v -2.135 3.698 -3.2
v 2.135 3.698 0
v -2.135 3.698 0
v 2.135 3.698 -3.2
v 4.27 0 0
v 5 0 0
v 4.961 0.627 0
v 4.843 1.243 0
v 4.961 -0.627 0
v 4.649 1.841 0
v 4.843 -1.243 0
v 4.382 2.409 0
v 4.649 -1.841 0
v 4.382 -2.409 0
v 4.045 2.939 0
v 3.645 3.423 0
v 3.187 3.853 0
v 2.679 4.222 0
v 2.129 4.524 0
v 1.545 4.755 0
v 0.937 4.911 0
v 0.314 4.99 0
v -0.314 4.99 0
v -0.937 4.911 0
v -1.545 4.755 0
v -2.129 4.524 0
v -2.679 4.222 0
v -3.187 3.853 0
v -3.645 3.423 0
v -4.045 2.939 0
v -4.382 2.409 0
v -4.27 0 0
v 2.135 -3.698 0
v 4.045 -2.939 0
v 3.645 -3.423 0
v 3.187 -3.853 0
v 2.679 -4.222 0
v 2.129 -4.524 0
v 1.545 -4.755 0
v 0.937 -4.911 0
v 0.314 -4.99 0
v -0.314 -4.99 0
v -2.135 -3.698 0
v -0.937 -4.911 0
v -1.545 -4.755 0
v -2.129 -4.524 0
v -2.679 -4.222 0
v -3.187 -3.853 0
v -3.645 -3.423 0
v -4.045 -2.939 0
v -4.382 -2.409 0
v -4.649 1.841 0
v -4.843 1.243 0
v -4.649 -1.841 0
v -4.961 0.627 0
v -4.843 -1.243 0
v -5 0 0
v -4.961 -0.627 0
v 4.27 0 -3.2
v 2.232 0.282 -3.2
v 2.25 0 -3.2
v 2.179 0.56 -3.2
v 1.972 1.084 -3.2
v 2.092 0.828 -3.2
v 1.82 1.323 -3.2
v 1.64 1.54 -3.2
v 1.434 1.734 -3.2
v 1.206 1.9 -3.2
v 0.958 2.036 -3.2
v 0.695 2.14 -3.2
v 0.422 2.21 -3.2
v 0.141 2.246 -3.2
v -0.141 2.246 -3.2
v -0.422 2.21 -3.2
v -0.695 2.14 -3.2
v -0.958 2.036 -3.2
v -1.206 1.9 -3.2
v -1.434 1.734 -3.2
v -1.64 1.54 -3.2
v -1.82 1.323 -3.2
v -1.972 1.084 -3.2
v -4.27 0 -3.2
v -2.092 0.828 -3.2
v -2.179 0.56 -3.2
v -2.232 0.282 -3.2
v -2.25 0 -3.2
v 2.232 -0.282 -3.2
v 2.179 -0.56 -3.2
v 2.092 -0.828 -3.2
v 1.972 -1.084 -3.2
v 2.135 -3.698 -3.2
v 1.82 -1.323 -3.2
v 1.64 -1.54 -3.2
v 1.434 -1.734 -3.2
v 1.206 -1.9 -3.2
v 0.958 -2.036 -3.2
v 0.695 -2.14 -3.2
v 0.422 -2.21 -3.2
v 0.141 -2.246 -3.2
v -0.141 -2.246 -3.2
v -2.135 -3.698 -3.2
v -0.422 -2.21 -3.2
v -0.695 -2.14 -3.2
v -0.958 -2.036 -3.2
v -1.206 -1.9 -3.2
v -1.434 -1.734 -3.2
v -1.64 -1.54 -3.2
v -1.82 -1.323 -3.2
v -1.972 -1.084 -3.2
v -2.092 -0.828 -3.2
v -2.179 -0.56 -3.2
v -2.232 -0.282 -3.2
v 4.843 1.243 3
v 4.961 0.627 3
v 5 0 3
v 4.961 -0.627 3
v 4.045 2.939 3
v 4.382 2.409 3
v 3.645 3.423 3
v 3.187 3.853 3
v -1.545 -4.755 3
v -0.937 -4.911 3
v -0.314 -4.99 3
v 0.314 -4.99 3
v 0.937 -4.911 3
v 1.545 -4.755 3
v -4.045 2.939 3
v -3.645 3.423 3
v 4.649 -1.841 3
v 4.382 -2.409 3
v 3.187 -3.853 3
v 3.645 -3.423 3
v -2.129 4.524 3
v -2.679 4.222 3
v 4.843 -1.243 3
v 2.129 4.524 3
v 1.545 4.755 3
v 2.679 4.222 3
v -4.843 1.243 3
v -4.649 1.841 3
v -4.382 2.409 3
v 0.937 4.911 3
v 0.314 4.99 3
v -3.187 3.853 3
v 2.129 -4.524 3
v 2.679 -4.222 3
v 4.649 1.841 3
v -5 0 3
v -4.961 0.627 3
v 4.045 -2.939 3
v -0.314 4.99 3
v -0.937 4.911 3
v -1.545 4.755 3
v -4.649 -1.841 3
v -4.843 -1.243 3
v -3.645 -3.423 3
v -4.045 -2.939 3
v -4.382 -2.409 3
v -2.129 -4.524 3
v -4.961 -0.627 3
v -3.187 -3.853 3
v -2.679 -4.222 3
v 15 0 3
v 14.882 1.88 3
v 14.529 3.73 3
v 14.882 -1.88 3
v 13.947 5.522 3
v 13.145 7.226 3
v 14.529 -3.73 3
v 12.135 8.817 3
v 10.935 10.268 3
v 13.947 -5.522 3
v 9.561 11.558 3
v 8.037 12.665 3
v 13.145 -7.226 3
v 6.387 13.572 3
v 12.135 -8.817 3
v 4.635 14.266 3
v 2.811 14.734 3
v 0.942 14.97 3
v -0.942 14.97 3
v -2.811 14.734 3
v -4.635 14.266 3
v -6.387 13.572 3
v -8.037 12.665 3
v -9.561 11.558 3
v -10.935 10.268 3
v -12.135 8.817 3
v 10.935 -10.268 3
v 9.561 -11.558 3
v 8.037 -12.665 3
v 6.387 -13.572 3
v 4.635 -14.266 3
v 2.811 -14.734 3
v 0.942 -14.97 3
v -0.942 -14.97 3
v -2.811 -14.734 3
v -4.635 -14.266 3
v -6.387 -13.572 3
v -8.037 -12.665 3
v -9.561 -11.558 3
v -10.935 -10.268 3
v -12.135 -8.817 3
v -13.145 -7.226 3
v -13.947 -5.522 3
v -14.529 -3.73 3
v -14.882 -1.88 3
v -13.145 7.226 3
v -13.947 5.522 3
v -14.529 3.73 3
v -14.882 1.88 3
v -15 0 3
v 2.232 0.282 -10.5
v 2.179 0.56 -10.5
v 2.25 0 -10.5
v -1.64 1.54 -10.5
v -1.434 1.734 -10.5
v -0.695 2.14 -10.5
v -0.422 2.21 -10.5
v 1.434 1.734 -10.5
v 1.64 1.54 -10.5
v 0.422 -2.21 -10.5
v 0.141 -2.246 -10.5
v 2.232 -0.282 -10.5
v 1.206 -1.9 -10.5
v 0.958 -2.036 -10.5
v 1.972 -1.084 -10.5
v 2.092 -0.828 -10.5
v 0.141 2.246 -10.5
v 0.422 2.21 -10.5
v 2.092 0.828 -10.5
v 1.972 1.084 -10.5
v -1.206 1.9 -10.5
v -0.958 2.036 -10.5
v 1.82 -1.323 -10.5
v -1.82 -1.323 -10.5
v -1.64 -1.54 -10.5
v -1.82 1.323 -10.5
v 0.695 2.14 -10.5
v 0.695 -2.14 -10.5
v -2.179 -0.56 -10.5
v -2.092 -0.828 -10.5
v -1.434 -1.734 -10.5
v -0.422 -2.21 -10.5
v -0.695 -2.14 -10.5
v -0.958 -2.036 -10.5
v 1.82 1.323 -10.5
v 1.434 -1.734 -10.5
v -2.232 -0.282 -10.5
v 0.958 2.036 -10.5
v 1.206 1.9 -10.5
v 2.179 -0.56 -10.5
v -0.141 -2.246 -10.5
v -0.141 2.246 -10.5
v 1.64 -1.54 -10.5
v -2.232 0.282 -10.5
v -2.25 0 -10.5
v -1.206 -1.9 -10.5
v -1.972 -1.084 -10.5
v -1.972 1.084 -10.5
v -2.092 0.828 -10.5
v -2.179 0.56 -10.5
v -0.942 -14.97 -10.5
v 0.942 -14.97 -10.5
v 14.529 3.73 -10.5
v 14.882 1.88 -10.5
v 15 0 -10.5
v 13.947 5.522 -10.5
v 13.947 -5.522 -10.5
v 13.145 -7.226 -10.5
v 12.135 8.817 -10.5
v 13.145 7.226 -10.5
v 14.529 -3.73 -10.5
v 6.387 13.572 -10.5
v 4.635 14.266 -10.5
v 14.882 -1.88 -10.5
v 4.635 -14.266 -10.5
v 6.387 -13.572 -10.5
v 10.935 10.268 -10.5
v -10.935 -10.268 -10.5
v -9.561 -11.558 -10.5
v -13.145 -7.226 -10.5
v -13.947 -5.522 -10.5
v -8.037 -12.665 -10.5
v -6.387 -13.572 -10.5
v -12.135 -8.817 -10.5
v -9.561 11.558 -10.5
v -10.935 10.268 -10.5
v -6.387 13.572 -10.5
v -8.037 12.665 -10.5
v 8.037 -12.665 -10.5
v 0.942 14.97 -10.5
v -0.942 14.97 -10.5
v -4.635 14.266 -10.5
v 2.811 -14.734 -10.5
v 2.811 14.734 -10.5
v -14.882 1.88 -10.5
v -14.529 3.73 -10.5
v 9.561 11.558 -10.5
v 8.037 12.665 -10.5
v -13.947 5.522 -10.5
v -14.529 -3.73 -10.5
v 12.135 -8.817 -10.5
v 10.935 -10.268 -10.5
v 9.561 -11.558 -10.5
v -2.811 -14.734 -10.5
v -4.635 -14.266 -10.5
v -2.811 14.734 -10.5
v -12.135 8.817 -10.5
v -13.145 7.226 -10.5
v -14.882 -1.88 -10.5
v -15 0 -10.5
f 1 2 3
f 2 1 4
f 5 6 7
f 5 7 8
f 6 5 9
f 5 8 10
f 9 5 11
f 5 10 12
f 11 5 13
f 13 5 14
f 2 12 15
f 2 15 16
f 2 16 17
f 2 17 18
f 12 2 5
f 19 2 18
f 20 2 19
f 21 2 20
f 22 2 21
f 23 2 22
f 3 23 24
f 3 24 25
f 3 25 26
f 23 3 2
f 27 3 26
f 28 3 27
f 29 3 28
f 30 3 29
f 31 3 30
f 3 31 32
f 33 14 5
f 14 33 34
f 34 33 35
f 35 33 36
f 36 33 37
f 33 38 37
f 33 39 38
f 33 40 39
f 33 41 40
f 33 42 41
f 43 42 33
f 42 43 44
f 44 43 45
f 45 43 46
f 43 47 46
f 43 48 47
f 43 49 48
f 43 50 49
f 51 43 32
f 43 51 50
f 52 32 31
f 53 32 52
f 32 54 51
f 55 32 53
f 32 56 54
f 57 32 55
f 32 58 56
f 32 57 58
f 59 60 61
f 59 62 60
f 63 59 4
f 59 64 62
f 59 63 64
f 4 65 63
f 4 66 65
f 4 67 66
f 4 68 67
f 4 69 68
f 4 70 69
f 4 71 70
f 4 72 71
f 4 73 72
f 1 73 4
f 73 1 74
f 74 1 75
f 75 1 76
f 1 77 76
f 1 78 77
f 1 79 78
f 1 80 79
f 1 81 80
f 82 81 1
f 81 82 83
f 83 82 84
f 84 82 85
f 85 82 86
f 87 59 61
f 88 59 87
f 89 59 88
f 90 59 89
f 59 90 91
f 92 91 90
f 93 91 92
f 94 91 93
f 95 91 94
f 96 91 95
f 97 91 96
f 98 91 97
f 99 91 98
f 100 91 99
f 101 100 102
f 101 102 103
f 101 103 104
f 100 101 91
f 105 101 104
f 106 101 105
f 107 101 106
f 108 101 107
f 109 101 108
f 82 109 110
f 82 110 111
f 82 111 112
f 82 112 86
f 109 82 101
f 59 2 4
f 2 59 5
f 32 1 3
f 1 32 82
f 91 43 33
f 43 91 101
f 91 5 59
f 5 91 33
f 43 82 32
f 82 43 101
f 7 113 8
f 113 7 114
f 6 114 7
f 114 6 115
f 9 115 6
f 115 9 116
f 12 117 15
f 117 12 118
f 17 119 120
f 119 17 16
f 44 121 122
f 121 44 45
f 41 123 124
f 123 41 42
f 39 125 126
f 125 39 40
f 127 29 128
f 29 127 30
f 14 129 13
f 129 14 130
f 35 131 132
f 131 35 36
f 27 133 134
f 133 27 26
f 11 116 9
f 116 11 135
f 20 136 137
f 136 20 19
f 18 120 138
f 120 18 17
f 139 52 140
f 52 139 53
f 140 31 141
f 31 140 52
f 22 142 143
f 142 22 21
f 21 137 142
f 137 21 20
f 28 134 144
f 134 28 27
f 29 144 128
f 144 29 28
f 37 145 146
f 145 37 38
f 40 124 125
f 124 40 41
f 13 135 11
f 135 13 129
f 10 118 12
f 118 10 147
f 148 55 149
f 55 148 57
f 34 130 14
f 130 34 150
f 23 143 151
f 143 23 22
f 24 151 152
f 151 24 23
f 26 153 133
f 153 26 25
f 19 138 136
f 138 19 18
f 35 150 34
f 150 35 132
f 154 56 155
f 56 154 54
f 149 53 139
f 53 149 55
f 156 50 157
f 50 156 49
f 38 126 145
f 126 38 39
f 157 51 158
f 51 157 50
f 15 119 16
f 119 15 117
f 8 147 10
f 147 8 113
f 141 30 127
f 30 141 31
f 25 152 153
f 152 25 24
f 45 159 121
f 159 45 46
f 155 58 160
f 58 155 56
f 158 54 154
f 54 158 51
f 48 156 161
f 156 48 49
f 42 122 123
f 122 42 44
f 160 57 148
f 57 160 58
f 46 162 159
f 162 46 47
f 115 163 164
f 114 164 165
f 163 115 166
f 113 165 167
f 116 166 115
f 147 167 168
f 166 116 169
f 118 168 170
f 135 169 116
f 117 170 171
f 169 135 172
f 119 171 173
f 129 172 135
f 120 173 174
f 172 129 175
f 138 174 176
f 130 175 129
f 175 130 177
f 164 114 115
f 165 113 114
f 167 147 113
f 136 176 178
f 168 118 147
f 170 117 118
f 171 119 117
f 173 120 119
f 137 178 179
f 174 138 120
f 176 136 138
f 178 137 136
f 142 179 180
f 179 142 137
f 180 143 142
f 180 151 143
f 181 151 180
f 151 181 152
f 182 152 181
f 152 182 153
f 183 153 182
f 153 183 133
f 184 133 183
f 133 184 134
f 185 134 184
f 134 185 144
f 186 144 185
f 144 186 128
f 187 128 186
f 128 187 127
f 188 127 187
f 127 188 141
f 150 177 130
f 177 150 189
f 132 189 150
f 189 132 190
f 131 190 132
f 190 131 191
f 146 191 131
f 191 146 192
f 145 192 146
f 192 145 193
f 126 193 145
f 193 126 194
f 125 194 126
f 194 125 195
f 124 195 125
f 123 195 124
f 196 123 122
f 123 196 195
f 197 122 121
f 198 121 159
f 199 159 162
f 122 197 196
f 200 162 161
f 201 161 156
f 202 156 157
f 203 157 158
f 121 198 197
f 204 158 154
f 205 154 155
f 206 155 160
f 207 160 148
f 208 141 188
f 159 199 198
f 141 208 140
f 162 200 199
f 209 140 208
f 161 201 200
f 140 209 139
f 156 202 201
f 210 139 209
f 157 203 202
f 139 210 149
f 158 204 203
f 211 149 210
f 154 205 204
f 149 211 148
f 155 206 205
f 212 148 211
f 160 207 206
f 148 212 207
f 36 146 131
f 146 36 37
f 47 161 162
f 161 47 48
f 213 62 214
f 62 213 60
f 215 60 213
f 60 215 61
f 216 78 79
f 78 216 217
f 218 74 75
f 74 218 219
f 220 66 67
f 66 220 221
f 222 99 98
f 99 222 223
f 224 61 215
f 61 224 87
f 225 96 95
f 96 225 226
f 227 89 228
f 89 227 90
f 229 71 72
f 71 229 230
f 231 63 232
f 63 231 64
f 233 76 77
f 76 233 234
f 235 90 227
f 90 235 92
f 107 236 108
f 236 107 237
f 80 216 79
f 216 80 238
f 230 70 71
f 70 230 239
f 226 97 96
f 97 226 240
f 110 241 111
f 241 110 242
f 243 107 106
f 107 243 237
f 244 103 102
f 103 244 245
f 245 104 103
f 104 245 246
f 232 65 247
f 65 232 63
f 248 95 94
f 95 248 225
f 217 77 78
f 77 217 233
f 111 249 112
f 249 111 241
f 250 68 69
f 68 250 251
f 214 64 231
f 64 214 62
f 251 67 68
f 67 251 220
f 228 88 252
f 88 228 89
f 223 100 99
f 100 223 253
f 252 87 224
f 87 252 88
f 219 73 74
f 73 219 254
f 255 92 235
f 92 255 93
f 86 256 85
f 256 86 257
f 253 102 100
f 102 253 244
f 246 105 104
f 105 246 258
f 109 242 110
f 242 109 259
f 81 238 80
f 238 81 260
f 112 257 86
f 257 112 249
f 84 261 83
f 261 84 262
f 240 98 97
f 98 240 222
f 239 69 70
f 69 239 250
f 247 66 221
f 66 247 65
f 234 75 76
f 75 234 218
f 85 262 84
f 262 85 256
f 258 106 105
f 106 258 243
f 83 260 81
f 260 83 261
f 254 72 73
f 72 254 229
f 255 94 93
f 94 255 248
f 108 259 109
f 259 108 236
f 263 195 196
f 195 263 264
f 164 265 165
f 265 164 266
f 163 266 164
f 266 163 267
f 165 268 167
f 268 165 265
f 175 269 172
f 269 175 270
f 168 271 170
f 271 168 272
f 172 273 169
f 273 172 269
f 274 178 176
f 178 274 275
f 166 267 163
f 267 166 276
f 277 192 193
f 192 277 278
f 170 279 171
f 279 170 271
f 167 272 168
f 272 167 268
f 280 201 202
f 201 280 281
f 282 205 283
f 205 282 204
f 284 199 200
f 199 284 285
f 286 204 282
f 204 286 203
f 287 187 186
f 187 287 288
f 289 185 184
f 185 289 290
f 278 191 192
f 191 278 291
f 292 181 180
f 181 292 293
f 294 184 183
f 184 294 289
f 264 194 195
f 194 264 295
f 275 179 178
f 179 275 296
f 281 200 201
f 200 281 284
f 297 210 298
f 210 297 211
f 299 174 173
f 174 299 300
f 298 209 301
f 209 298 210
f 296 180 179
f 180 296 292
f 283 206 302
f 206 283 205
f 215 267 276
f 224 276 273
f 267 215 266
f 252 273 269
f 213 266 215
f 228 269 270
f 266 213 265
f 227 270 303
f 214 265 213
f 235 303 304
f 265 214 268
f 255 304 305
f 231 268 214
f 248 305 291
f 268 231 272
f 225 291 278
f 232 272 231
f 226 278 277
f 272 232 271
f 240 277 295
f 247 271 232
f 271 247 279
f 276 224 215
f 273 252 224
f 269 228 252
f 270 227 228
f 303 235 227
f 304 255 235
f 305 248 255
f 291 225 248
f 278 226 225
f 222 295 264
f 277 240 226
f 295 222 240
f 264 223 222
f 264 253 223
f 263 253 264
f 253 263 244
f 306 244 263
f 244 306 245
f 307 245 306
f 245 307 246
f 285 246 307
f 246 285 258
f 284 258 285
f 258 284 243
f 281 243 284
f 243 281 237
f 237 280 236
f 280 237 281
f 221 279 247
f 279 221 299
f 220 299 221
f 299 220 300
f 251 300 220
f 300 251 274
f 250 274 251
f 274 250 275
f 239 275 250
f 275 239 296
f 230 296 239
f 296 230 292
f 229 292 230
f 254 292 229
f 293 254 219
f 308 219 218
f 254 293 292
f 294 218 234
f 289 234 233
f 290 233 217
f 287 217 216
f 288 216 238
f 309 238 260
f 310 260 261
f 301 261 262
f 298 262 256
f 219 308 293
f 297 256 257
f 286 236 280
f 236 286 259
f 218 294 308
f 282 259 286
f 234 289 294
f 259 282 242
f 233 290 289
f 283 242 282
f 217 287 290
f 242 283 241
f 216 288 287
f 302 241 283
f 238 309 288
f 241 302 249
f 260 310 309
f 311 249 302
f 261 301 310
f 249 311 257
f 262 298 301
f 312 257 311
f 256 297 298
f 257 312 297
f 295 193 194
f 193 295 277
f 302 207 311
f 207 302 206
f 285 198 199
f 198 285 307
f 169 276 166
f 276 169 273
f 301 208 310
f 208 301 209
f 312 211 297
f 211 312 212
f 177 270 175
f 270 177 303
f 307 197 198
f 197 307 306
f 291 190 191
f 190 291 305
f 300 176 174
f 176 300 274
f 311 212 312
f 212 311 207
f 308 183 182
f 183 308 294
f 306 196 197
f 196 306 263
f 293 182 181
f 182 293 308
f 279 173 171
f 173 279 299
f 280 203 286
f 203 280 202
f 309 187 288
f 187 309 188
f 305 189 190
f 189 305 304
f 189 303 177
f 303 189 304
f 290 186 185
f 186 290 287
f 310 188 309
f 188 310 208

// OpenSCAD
$fn = 50;


difference() {
	union() {
		translate(v = [0, 0, -10.5000000000]) {
			cylinder(h = 13.5000000000, r = 15.0000000000);
		}
	}
	union() {
		translate(v = [0, 0, 0]) {
			rotate(a = [0, 0, 0]) {
				difference() {
					union() {
						translate(v = [0, 0, -3.2000000000]) {
							linear_extrude(height = 3.2000000000) {
								polygon(points = [[4.2698000000, 0.0000000000], [2.1349000000, 3.6977552691], [-2.1349000000, 3.6977552691], [-4.2698000000, 0.0000000000], [-2.1349000000, -3.6977552691], [2.1349000000, -3.6977552691]]);
							}
						}
					}
					union();
				}
			}
		}
		#cylinder(h = 3, r = 5.0000000000);
		#translate(v = [0, 0, -100.0000000000]) {
			cylinder(h = 200, r = 2.2500000000);
		}
	}
}
